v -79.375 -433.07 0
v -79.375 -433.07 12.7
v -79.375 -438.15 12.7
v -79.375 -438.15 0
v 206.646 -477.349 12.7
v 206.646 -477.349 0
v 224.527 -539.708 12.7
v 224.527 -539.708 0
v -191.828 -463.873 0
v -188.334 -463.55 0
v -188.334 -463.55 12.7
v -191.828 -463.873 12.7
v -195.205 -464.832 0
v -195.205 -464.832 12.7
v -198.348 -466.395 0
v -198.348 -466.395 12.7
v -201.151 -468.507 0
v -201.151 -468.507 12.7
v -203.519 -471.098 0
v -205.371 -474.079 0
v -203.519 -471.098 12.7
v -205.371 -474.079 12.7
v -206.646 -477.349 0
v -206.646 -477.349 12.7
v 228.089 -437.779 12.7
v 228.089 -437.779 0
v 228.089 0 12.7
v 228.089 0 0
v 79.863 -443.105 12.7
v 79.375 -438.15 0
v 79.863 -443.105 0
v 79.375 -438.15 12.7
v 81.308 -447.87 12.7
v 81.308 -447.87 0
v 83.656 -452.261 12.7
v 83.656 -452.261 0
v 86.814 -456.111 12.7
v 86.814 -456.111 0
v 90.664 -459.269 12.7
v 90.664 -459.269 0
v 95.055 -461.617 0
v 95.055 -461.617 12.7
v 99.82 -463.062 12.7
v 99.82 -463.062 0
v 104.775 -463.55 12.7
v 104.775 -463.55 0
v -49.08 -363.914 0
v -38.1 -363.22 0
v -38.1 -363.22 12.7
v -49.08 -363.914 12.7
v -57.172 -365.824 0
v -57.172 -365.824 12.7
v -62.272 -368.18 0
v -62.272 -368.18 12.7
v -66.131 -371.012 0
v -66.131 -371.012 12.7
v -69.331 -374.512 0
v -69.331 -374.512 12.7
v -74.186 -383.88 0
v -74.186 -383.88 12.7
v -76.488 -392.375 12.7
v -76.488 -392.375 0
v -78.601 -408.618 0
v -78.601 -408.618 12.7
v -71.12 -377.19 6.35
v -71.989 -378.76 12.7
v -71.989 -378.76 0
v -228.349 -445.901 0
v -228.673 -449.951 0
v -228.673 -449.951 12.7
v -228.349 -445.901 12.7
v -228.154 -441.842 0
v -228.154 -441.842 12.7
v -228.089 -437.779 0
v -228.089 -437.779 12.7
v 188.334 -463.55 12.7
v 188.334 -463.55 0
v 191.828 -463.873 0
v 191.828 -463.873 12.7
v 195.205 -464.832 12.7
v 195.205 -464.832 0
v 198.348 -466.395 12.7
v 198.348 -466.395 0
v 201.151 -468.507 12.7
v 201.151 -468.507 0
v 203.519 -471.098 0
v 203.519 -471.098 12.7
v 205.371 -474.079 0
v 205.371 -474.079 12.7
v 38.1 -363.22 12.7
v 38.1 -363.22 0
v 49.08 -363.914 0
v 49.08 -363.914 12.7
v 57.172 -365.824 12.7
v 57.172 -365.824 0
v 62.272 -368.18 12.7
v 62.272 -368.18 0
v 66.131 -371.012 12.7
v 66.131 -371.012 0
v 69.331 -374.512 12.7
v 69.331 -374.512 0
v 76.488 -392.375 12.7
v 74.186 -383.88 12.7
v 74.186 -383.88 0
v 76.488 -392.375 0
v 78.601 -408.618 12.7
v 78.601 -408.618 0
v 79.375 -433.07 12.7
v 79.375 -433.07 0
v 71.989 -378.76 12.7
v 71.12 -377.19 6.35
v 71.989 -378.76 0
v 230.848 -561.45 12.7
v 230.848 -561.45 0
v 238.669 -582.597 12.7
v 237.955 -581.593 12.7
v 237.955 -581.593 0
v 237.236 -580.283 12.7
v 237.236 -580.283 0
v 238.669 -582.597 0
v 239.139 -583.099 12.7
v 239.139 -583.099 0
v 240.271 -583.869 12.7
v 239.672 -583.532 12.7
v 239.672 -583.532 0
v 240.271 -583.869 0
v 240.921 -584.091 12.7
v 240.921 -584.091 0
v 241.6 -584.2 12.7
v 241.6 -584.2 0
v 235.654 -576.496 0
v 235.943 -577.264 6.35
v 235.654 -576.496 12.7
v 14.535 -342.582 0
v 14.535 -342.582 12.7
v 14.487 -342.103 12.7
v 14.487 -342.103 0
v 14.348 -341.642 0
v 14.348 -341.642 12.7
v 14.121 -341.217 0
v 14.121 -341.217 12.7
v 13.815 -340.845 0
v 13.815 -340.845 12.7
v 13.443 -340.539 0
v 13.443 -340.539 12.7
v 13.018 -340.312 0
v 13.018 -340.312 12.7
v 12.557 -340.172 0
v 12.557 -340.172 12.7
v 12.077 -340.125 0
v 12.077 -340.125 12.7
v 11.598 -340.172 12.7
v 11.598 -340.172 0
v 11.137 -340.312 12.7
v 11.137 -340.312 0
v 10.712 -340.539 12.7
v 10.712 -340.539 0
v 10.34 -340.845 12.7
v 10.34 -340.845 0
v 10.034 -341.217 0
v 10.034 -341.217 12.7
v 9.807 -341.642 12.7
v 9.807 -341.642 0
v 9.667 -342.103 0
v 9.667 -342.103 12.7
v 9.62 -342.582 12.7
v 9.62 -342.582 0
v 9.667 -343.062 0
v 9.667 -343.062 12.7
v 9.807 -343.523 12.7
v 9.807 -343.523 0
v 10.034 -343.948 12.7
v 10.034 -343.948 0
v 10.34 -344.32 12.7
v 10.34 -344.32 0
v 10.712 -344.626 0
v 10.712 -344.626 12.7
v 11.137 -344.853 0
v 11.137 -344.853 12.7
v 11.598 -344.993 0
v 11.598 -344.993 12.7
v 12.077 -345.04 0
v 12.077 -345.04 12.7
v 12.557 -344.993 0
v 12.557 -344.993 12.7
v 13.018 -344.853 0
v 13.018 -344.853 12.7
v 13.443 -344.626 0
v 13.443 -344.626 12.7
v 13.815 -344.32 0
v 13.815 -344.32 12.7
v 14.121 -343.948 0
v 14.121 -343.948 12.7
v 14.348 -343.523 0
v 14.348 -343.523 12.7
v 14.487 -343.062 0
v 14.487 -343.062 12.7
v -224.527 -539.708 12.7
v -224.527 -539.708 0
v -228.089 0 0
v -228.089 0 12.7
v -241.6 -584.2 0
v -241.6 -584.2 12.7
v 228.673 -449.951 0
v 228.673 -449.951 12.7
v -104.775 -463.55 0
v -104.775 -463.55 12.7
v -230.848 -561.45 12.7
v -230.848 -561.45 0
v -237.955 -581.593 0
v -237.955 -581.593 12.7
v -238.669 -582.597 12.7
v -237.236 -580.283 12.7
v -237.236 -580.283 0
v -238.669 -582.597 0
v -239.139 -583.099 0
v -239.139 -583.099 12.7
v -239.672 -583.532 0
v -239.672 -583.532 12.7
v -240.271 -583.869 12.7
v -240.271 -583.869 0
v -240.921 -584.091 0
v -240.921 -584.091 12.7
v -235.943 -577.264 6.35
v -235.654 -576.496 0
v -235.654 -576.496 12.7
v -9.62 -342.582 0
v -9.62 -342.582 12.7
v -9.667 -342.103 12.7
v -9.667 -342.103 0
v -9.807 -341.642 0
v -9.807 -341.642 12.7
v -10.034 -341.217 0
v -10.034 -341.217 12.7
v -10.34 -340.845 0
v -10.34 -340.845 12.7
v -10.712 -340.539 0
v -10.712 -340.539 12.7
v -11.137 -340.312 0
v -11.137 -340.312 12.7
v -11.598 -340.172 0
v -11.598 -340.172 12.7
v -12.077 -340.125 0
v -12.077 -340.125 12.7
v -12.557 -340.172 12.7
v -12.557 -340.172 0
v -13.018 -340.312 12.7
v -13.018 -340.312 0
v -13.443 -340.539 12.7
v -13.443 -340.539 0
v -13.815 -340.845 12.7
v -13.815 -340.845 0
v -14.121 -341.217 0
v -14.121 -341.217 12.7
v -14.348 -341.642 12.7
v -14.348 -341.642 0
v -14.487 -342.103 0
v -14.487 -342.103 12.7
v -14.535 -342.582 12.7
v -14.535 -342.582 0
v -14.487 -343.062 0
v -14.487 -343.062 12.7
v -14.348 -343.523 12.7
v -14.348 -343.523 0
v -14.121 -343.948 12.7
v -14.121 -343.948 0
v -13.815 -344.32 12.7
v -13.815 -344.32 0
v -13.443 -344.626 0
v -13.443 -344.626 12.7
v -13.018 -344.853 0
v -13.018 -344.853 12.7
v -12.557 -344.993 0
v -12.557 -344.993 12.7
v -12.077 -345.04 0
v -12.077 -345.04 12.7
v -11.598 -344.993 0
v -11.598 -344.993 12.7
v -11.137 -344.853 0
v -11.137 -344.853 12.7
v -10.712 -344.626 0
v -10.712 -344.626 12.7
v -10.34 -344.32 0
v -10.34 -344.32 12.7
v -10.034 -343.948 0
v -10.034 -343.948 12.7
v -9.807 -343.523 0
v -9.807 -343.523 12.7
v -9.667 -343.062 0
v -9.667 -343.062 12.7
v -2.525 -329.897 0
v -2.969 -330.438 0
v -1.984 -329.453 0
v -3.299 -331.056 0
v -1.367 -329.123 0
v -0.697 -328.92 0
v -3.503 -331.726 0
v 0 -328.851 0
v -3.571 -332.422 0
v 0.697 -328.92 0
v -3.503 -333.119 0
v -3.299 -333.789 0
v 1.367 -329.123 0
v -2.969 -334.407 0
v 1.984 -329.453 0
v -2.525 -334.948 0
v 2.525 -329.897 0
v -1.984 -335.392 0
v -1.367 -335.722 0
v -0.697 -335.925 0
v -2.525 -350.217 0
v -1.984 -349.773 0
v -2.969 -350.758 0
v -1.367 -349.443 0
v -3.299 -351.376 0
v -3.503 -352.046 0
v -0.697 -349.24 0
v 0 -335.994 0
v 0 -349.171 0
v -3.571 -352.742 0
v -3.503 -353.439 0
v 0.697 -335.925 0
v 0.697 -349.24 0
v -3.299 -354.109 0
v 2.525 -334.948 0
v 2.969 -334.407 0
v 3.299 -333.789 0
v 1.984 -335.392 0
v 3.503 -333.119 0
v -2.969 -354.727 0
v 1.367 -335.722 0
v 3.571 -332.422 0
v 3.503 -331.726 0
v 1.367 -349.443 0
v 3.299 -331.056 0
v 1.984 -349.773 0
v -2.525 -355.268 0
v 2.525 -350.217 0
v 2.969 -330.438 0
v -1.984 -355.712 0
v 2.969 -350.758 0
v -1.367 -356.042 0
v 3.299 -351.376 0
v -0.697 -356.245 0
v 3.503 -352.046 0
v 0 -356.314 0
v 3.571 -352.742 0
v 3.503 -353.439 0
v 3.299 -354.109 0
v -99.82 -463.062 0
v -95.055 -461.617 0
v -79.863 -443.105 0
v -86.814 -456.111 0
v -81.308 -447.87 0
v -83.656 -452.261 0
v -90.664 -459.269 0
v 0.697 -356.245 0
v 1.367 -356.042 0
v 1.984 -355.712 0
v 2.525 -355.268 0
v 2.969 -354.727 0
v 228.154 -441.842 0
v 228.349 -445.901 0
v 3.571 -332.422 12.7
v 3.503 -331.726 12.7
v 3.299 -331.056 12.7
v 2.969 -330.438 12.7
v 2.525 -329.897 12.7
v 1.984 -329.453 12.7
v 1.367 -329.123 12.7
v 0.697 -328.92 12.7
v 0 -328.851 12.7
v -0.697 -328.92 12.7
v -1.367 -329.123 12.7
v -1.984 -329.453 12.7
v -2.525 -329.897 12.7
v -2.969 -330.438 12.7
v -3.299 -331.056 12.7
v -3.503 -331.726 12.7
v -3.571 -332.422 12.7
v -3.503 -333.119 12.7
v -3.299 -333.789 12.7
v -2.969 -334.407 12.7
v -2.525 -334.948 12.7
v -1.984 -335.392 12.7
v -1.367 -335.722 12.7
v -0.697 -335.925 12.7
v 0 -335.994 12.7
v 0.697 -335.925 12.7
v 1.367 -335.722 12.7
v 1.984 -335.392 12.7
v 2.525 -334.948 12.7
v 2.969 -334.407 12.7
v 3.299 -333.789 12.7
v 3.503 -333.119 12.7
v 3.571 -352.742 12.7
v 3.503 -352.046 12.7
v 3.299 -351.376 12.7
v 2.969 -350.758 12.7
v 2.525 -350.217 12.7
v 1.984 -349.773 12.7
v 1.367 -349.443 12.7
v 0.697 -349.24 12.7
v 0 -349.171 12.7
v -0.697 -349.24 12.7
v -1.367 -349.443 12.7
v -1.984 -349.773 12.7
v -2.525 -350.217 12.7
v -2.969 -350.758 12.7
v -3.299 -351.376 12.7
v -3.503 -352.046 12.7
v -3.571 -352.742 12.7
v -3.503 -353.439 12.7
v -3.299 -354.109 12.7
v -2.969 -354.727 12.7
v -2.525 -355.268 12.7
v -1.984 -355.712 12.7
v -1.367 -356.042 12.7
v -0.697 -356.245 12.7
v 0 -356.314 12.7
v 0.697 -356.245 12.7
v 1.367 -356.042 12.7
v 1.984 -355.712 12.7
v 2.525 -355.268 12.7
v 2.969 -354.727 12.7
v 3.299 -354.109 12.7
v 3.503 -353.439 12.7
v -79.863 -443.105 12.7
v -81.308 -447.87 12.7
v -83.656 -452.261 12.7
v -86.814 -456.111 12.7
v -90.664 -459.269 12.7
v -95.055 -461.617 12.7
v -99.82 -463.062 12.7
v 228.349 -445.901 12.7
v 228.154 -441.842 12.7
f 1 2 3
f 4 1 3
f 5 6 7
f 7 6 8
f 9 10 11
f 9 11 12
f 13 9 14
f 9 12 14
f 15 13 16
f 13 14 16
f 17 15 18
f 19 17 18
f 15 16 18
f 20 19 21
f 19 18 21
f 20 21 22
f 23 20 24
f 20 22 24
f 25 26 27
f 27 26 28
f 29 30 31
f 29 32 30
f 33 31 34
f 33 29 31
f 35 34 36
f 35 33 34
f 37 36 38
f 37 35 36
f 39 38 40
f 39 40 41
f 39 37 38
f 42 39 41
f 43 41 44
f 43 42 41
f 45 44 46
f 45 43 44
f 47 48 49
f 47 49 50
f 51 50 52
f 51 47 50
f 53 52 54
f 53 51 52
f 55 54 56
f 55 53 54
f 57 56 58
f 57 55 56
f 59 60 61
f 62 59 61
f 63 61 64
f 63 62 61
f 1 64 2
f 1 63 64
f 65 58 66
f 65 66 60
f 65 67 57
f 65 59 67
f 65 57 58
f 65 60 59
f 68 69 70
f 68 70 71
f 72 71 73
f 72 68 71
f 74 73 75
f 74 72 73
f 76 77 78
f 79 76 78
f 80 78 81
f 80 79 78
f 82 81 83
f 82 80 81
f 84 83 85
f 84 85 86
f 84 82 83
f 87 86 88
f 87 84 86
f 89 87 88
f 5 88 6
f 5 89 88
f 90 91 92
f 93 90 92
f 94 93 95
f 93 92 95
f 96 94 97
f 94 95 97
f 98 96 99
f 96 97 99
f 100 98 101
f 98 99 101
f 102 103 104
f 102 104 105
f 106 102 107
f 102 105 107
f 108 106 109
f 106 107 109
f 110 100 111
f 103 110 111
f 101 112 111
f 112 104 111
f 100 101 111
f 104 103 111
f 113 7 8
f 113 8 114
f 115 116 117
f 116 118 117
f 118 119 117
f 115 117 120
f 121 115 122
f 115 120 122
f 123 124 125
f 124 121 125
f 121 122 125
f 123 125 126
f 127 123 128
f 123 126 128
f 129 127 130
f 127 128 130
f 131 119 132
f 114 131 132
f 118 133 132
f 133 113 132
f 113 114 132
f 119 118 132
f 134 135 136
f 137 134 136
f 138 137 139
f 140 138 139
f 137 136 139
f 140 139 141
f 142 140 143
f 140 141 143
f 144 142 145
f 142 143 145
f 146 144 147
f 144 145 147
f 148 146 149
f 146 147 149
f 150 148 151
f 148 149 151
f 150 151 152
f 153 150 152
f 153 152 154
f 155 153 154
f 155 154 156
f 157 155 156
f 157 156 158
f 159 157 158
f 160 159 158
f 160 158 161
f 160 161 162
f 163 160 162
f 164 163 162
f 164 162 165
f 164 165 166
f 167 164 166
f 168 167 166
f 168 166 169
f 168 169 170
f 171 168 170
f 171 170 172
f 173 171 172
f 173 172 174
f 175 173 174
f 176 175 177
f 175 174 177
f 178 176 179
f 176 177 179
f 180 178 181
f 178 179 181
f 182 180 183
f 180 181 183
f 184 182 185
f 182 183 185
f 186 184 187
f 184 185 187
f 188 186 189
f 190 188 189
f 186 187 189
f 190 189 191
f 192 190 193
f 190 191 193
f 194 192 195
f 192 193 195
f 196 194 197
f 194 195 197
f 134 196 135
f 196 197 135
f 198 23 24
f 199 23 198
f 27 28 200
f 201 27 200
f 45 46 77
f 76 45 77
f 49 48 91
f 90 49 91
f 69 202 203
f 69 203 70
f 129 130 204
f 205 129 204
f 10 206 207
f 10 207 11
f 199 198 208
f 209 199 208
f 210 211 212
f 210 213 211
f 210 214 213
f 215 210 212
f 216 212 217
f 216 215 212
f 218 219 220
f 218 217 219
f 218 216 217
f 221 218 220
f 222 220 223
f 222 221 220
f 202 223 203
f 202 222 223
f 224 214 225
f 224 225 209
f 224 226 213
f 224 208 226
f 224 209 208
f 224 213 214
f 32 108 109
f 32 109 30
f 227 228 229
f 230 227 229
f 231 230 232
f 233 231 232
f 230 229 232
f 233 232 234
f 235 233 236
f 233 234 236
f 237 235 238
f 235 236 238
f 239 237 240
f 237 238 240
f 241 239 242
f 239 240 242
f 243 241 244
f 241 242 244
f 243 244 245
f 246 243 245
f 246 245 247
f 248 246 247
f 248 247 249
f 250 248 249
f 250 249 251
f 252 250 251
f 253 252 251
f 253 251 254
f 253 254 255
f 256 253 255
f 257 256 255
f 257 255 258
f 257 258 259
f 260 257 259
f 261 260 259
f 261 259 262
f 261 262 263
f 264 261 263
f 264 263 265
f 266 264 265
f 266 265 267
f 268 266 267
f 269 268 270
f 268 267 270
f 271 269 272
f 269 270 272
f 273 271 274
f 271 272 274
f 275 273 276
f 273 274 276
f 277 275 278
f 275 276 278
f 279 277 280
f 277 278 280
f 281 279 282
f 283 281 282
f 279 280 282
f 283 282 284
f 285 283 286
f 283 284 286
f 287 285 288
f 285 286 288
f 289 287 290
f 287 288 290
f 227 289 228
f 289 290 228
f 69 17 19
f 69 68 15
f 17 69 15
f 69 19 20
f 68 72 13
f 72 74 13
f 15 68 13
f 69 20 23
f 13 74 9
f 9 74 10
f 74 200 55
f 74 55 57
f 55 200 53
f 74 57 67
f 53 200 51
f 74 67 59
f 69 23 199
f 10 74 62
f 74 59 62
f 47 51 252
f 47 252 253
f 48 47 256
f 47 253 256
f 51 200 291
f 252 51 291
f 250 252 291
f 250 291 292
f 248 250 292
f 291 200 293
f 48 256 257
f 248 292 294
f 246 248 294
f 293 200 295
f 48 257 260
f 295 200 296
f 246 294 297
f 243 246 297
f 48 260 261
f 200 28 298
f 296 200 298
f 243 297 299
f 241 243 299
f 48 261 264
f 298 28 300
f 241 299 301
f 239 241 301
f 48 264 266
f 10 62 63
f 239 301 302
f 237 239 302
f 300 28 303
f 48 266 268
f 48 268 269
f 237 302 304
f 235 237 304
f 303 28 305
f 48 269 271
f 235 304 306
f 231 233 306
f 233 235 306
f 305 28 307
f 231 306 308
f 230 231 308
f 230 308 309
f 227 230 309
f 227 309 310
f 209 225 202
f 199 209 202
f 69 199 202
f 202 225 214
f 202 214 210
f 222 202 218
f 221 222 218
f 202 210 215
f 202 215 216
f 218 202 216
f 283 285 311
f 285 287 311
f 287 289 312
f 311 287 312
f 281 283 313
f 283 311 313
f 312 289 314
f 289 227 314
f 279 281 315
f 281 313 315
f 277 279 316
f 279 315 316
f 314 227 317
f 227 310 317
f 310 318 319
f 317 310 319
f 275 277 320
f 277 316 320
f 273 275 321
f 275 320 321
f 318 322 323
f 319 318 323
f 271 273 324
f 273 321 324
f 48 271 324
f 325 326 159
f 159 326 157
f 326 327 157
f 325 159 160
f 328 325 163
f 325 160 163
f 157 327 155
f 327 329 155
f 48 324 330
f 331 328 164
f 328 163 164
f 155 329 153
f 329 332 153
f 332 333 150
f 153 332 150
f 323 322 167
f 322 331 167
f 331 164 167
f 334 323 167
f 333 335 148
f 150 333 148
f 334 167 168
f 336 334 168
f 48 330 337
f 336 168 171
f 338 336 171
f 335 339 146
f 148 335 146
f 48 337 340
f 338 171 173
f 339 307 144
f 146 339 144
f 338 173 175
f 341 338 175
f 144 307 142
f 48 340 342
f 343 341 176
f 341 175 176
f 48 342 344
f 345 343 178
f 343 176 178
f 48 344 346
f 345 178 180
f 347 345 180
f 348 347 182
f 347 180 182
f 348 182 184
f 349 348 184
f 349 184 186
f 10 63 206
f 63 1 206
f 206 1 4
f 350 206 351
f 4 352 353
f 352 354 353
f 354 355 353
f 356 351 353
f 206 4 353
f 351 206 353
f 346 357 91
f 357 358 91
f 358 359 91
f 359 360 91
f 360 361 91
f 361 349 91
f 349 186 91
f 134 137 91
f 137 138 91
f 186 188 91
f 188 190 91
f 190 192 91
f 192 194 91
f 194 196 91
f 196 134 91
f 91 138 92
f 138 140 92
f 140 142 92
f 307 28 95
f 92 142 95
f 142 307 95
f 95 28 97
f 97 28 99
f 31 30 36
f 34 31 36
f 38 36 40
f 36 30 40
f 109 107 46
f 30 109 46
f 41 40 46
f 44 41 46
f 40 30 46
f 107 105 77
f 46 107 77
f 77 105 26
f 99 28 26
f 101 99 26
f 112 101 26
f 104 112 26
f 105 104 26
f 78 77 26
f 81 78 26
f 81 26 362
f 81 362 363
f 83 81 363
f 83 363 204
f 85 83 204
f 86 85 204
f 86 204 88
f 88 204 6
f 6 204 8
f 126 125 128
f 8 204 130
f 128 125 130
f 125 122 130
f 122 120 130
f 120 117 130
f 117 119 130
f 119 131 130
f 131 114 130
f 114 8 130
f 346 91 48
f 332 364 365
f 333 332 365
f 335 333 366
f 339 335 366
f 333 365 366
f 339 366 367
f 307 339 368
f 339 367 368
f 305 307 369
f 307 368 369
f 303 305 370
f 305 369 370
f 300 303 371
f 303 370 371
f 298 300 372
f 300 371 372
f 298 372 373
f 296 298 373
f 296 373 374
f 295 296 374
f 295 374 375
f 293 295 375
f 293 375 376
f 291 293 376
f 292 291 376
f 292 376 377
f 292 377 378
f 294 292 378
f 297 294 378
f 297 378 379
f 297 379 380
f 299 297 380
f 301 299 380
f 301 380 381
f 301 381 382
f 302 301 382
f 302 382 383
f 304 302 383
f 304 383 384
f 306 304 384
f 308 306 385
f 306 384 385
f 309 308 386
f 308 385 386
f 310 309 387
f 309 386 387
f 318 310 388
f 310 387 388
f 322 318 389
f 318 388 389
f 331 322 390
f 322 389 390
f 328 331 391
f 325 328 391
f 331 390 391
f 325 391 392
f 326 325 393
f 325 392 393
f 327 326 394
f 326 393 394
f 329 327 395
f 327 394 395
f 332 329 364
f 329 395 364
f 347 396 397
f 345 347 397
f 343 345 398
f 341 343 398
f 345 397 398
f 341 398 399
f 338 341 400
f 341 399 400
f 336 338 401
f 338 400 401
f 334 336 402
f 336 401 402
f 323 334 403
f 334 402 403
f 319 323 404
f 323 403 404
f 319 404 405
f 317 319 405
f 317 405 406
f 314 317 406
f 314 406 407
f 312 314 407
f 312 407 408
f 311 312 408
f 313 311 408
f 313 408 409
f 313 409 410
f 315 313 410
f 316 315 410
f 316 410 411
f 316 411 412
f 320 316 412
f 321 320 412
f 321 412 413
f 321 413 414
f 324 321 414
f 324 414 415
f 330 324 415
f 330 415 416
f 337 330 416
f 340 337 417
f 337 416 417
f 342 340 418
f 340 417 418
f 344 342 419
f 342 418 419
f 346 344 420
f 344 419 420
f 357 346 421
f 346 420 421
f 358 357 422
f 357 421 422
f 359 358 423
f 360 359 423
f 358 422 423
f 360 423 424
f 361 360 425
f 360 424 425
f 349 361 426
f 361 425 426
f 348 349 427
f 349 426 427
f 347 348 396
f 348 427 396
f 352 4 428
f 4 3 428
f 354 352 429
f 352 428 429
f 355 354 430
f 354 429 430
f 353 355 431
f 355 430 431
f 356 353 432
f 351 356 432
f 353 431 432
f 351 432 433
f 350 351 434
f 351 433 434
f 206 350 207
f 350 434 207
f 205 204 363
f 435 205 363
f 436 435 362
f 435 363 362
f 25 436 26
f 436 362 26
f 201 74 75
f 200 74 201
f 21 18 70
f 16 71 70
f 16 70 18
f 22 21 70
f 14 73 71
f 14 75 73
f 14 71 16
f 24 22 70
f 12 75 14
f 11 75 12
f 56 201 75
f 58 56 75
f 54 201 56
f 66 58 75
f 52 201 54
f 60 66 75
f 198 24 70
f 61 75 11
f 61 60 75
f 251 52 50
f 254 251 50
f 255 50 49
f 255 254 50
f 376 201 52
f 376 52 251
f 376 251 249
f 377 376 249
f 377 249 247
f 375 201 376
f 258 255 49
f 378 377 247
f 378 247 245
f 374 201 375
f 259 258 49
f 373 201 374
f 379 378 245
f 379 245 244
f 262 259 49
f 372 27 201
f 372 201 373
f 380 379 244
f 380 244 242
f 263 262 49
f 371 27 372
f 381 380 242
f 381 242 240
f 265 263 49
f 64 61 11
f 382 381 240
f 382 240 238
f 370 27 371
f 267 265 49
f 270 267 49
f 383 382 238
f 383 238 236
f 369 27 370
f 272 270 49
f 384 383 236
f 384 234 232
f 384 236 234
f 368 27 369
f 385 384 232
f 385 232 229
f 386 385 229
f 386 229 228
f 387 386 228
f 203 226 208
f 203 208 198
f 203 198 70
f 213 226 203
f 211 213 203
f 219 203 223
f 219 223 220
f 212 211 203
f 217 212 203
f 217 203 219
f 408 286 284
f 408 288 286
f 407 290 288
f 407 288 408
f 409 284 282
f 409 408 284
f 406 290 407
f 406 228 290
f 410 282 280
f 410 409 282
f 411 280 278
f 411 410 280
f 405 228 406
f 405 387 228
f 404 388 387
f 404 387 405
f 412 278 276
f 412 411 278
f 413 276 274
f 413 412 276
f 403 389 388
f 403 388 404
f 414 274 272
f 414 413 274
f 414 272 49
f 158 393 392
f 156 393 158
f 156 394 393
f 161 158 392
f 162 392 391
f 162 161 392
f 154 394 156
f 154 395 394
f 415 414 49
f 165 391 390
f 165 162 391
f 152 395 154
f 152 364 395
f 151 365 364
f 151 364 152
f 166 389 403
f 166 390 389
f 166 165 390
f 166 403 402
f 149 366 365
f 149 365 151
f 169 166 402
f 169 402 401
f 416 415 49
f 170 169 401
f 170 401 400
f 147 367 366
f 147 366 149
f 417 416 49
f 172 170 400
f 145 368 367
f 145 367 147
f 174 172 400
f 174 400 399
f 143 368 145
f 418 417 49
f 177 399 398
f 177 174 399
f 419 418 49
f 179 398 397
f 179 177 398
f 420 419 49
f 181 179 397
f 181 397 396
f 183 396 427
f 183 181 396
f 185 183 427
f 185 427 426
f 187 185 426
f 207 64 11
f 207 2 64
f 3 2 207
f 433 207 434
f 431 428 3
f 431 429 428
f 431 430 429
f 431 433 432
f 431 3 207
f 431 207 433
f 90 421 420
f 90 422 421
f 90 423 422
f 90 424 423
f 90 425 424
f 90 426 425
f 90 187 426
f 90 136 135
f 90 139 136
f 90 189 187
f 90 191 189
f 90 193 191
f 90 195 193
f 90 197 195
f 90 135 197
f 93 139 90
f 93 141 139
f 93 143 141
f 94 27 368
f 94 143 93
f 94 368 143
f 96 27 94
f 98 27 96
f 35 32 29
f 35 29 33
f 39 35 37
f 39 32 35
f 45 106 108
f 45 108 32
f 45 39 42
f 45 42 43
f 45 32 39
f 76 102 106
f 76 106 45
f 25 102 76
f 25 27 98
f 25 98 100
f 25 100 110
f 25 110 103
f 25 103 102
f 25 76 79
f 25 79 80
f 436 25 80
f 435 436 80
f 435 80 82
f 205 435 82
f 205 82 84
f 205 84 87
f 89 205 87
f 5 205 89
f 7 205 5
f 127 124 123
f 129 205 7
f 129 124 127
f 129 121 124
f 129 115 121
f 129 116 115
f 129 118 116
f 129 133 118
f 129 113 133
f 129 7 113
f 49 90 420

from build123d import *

# Parameters (mm, degrees)
BOSS_EXTRUDE1_DEPTH     = 12.7
FILLET2_SIZE            = 41.275
FILLET2_SIZE_2          = 69.85
FILLET3_R               = 25.4
FILLET4_R               = 19.05
FILLET5_START           = -1
FILLET5_DEPTH           = 15
FILLET6_R               = 127
CUT_EXTRUDE1_REACH      = 634.314
SKETCH3_W               = 241.600142069
SKETCH3_H               = 584.2
F_8_CLEARANCE_HOLE1_D   = 4.9149
F_1_4_CLEARANCE_HOLE1_D = 7.14248


with BuildPart() as part:
    # Sketch1 → Boss-Extrude1 (new body)
    with BuildSketch(Plane.XY):
        Polygon((-228.088766336, 0), (228.088766336, 0), (228.088766336, -443.878997916), (241.600142069, -584.2), (237.284597128, -584.2), (202.688766336, -463.55), (79.375, -463.55), (79.375, -363.22), (-79.375, -363.22), (-79.375, -463.55), (-202.688766336, -463.55), (-237.284597128, -584.2), (-241.600142069, -584.2), (-228.088766336, -443.878997916), align=None)
    extrude(amount=BOSS_EXTRUDE1_DEPTH)

    # Fillet2
    # a fillet whose section is not a circle: 69.85, 41.275 mm, written as the material it adds along each edge
    with BuildSketch(Plane(origin=(-79.375, -363.22, 0), x_dir=(1, 0, 0), z_dir=(0, 0, 1))) as fillet2_piece_1:
        with BuildLine():
            Bezier((FILLET2_SIZE, 0), (0, 0), (0, -FILLET2_SIZE_2), weights=[1, 1.5, 1])
            Line((0, -FILLET2_SIZE_2), (0, 0))
            Line((0, 0), (FILLET2_SIZE, 0))
        make_face()
    extrude(amount=12.7)

    # Fillet3
    fillet3_edges = [part.edges().sort_by_distance(p)[0] for p in [
        (-79.375, -463.55, 6.35),
    ]]
    fillet(fillet3_edges, radius=FILLET3_R)

    # Fillet4
    fillet4_edges = [part.edges().sort_by_distance(p)[0] for p in [
        (-202.688766336, -463.55, 6.35),
    ]]
    fillet(fillet4_edges, radius=FILLET4_R)

    # Fillet5: read off the stored shape, not the designer's step
    # Fillet5 outline → Fillet5 (cut)
    with BuildSketch(Plane.XY.offset(FILLET5_START)):
        with BuildLine():
            Line((-237.284597128, -584.2), (-224.526592015, -539.707548693))
            add(Edge.make_bspline(
                [(-224.526592015, -539.707548693), (-237.177095318, -583.825096633), (-241.600142069, -584.2)],
                knots=[0, 0, 0, 1, 1, 1], degree=2, weights=[1, 2.333333333, 1]))
            Line((-241.600142069, -584.2), (-237.284597128, -584.2))
        make_face()
    extrude(amount=FILLET5_DEPTH, mode=Mode.SUBTRACT)

    # Fillet6
    # the kernel refuses this fillet: 127 mm, written as the material it adds along each edge
    with BuildSketch(Plane(origin=(-228.088766336, -443.878997916, 0), x_dir=(0, 1, 0), z_dir=(0, 0, 1))) as fillet6_piece_1:
        with BuildLine():
            CenterArc((FILLET6_R * 0.0480334444852, FILLET6_R), FILLET6_R, 264.5, 5.5)
            Line((-FILLET6_R * 0.047812308035, FILLET6_R * 0.00460380163282), (0, 0))
            Line((0, 0), (FILLET6_R * 0.0480334444852, 0))
        make_face()
    extrude(amount=12.7)

    # Sketch3 → Cut-Extrude1 (cut, up to next)
    with BuildSketch(Plane.XY.offset(12.7), mode=Mode.PRIVATE) as cut_extrude1_sk1:
        with Locations((120.800071035, -292.1)):
            Rectangle(SKETCH3_W, SKETCH3_H)
    cut_extrude1_tool1 = extrude(cut_extrude1_sk1.sketch, amount=-CUT_EXTRUDE1_REACH, mode=Mode.PRIVATE) & part.part
    add(cut_extrude1_tool1.solids().sort_by_distance((120.800071, -292.1, 12.7))[0], mode=Mode.SUBTRACT)

    # Mirror5: part across plane


with BuildPart() as part_1:
    add(part.part)
    add(part.part.mirror(Plane(origin=(0, 0, -0.35025), x_dir=(0, 0, 1), z_dir=(-1, 0, 0))))

    # #8 Clearance Hole1 (through all)
    with Locations(Plane(origin=(0, 0, 0), x_dir=(-1, 0, 0), z_dir=(0, 0, -1))):
        with Locations((12.077216058, -342.5825), (-12.077216058, -342.5825)):
            Hole(F_8_CLEARANCE_HOLE1_D / 2)

    # 1/4 Clearance Hole1 (through all)
    with Locations(Plane(origin=(0, 0, 0), x_dir=(-1, 0, 0), z_dir=(0, 0, -1))):
        with Locations((0, -352.7425), (0, -332.4225)):
            Hole(F_1_4_CLEARANCE_HOLE1_D / 2)


solid = part_1.part
